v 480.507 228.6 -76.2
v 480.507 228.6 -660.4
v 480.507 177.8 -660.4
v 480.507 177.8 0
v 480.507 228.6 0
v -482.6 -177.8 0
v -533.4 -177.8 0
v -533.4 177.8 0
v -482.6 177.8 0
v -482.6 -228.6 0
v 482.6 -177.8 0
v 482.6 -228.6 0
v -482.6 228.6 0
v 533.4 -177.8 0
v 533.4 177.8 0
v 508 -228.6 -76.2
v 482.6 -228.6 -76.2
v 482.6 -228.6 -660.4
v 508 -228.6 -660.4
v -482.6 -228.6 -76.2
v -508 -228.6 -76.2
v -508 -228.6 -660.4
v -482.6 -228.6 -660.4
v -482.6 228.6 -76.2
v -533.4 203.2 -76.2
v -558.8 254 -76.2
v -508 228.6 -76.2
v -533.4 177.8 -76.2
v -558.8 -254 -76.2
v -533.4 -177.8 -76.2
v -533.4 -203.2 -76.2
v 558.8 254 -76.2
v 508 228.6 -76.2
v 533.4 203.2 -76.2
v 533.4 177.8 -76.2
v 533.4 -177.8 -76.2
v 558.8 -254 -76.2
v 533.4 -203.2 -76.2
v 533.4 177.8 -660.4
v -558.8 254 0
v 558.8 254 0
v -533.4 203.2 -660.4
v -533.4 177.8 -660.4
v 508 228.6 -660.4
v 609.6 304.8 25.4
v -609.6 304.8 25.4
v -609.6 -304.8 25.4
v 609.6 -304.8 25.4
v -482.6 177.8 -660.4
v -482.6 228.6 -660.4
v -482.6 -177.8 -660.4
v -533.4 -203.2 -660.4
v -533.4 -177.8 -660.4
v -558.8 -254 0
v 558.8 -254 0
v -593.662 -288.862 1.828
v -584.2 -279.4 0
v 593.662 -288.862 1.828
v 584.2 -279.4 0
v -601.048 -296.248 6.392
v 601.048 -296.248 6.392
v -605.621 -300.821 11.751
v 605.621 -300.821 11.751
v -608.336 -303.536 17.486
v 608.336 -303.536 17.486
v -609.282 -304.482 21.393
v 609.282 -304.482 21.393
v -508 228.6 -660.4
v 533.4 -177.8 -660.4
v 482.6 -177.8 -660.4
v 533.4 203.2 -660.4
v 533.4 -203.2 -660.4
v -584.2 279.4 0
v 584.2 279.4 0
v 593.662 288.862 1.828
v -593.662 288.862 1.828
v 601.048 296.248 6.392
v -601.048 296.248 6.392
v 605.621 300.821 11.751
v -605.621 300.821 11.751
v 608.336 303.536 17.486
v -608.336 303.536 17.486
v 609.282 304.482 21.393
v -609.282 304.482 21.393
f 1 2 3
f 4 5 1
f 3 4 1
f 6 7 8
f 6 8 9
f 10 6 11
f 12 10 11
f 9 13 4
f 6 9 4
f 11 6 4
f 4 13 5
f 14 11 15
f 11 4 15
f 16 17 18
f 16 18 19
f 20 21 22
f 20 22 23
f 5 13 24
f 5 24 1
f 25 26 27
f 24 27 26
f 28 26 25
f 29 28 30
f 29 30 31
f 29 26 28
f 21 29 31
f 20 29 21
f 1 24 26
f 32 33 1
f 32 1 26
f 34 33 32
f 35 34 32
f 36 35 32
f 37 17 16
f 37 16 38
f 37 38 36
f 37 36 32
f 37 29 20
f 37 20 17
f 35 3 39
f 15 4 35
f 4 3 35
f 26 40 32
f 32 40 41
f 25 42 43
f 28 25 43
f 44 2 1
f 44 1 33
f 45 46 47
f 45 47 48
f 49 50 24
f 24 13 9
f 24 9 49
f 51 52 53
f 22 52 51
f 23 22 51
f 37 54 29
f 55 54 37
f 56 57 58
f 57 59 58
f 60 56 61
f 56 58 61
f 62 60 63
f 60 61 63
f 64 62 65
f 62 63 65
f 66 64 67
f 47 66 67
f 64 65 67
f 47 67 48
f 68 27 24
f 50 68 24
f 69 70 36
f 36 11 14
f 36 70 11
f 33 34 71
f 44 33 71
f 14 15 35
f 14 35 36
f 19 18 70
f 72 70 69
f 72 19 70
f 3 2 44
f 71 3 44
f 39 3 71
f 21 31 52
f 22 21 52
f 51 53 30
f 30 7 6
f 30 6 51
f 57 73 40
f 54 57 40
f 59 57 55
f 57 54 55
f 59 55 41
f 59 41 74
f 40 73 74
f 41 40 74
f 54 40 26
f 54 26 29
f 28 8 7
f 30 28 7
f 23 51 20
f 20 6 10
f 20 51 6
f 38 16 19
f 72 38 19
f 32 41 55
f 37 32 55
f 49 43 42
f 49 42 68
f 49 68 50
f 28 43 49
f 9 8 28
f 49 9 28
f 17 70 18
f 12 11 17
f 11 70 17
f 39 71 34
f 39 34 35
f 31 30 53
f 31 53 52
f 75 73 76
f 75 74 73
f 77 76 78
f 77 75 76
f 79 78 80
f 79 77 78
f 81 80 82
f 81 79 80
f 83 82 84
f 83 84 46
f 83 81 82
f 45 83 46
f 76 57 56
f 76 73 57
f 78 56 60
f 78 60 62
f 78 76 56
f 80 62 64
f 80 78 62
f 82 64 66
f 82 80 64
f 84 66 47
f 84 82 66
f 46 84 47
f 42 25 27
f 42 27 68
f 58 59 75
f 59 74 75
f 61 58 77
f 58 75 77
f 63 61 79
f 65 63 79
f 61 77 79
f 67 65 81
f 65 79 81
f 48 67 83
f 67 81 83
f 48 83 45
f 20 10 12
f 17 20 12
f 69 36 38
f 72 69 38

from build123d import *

# Parameters (mm, degrees)
F0_W     = 1219.2
F0_H     = 609.6
F1_DEPTH = 25.4
F2_W     = 1117.6
F2_H     = 508
F2_W_2   = 1066.8
F2_H_2   = 457.2
F3_DEPTH = 76.2
F4_W     = 50.8
F4_H     = 50.8
F4_W_2   = 52.8930136204
F5_DEPTH = 660.4
F6_R     = 25.39999
F7_SIZE  = 25.4


# Not quite as in the source:
# - a fillet or chamfer is up to 0.001 mm smaller than in the source, because OpenCascade refuses the exact size


with BuildPart() as f1:
    # F0 (on Top) → F1 (new body)
    with BuildSketch(Plane.XY):
        Rectangle(F0_W, F0_H)
    extrude(amount=F1_DEPTH)

    # F2 (on face) → F3 (join)
    with BuildSketch(Plane(origin=(0, 0, 0), x_dir=(1, 0, 0), z_dir=(0, 0, -1))):
        Rectangle(F2_W, F2_H)
        Rectangle(F2_W_2, F2_H_2, mode=Mode.SUBTRACT)
    extrude(amount=F3_DEPTH)

    # F4 (on face) → F5 (join)
    with BuildSketch(Plane(origin=(0, 0, 0), x_dir=(1, 0, 0), z_dir=(0, 0, -1))):
        with Locations((-508, 203.2)):
            Rectangle(F4_W, F4_H)
        with Locations((-508, -203.2)):
            Rectangle(F4_W, F4_H)
        with Locations((506.9534931898, -203.2)):
            Rectangle(F4_W_2, F4_H)
        with Locations((508, 203.2)):
            Rectangle(F4_W, F4_H)
    extrude(amount=F5_DEPTH)

    # F6 (radius 25.4 in the source; OpenCascade refuses exactly that, so slightly less here)
    f6_edges = [f1.edges().sort_by_distance(p)[0] for p in [
        (0, 304.8, 0),
        (-609.6, 0, 0),
        (609.6, 0, 0),
        (0, -304.8, 0),
    ]]
    fillet(f6_edges, radius=F6_R)

    # F7
    f7_edges = [f1.edges().sort_by_distance(p)[0] for p in [
        (-533.4, -228.6, -368.3),
        (-533.4, 228.6, -368.3),
        (533.4, 228.6, -368.3),
        (533.4, -228.6, -368.3),
    ]]
    chamfer(f7_edges, length=F7_SIZE)


solid = f1.part
